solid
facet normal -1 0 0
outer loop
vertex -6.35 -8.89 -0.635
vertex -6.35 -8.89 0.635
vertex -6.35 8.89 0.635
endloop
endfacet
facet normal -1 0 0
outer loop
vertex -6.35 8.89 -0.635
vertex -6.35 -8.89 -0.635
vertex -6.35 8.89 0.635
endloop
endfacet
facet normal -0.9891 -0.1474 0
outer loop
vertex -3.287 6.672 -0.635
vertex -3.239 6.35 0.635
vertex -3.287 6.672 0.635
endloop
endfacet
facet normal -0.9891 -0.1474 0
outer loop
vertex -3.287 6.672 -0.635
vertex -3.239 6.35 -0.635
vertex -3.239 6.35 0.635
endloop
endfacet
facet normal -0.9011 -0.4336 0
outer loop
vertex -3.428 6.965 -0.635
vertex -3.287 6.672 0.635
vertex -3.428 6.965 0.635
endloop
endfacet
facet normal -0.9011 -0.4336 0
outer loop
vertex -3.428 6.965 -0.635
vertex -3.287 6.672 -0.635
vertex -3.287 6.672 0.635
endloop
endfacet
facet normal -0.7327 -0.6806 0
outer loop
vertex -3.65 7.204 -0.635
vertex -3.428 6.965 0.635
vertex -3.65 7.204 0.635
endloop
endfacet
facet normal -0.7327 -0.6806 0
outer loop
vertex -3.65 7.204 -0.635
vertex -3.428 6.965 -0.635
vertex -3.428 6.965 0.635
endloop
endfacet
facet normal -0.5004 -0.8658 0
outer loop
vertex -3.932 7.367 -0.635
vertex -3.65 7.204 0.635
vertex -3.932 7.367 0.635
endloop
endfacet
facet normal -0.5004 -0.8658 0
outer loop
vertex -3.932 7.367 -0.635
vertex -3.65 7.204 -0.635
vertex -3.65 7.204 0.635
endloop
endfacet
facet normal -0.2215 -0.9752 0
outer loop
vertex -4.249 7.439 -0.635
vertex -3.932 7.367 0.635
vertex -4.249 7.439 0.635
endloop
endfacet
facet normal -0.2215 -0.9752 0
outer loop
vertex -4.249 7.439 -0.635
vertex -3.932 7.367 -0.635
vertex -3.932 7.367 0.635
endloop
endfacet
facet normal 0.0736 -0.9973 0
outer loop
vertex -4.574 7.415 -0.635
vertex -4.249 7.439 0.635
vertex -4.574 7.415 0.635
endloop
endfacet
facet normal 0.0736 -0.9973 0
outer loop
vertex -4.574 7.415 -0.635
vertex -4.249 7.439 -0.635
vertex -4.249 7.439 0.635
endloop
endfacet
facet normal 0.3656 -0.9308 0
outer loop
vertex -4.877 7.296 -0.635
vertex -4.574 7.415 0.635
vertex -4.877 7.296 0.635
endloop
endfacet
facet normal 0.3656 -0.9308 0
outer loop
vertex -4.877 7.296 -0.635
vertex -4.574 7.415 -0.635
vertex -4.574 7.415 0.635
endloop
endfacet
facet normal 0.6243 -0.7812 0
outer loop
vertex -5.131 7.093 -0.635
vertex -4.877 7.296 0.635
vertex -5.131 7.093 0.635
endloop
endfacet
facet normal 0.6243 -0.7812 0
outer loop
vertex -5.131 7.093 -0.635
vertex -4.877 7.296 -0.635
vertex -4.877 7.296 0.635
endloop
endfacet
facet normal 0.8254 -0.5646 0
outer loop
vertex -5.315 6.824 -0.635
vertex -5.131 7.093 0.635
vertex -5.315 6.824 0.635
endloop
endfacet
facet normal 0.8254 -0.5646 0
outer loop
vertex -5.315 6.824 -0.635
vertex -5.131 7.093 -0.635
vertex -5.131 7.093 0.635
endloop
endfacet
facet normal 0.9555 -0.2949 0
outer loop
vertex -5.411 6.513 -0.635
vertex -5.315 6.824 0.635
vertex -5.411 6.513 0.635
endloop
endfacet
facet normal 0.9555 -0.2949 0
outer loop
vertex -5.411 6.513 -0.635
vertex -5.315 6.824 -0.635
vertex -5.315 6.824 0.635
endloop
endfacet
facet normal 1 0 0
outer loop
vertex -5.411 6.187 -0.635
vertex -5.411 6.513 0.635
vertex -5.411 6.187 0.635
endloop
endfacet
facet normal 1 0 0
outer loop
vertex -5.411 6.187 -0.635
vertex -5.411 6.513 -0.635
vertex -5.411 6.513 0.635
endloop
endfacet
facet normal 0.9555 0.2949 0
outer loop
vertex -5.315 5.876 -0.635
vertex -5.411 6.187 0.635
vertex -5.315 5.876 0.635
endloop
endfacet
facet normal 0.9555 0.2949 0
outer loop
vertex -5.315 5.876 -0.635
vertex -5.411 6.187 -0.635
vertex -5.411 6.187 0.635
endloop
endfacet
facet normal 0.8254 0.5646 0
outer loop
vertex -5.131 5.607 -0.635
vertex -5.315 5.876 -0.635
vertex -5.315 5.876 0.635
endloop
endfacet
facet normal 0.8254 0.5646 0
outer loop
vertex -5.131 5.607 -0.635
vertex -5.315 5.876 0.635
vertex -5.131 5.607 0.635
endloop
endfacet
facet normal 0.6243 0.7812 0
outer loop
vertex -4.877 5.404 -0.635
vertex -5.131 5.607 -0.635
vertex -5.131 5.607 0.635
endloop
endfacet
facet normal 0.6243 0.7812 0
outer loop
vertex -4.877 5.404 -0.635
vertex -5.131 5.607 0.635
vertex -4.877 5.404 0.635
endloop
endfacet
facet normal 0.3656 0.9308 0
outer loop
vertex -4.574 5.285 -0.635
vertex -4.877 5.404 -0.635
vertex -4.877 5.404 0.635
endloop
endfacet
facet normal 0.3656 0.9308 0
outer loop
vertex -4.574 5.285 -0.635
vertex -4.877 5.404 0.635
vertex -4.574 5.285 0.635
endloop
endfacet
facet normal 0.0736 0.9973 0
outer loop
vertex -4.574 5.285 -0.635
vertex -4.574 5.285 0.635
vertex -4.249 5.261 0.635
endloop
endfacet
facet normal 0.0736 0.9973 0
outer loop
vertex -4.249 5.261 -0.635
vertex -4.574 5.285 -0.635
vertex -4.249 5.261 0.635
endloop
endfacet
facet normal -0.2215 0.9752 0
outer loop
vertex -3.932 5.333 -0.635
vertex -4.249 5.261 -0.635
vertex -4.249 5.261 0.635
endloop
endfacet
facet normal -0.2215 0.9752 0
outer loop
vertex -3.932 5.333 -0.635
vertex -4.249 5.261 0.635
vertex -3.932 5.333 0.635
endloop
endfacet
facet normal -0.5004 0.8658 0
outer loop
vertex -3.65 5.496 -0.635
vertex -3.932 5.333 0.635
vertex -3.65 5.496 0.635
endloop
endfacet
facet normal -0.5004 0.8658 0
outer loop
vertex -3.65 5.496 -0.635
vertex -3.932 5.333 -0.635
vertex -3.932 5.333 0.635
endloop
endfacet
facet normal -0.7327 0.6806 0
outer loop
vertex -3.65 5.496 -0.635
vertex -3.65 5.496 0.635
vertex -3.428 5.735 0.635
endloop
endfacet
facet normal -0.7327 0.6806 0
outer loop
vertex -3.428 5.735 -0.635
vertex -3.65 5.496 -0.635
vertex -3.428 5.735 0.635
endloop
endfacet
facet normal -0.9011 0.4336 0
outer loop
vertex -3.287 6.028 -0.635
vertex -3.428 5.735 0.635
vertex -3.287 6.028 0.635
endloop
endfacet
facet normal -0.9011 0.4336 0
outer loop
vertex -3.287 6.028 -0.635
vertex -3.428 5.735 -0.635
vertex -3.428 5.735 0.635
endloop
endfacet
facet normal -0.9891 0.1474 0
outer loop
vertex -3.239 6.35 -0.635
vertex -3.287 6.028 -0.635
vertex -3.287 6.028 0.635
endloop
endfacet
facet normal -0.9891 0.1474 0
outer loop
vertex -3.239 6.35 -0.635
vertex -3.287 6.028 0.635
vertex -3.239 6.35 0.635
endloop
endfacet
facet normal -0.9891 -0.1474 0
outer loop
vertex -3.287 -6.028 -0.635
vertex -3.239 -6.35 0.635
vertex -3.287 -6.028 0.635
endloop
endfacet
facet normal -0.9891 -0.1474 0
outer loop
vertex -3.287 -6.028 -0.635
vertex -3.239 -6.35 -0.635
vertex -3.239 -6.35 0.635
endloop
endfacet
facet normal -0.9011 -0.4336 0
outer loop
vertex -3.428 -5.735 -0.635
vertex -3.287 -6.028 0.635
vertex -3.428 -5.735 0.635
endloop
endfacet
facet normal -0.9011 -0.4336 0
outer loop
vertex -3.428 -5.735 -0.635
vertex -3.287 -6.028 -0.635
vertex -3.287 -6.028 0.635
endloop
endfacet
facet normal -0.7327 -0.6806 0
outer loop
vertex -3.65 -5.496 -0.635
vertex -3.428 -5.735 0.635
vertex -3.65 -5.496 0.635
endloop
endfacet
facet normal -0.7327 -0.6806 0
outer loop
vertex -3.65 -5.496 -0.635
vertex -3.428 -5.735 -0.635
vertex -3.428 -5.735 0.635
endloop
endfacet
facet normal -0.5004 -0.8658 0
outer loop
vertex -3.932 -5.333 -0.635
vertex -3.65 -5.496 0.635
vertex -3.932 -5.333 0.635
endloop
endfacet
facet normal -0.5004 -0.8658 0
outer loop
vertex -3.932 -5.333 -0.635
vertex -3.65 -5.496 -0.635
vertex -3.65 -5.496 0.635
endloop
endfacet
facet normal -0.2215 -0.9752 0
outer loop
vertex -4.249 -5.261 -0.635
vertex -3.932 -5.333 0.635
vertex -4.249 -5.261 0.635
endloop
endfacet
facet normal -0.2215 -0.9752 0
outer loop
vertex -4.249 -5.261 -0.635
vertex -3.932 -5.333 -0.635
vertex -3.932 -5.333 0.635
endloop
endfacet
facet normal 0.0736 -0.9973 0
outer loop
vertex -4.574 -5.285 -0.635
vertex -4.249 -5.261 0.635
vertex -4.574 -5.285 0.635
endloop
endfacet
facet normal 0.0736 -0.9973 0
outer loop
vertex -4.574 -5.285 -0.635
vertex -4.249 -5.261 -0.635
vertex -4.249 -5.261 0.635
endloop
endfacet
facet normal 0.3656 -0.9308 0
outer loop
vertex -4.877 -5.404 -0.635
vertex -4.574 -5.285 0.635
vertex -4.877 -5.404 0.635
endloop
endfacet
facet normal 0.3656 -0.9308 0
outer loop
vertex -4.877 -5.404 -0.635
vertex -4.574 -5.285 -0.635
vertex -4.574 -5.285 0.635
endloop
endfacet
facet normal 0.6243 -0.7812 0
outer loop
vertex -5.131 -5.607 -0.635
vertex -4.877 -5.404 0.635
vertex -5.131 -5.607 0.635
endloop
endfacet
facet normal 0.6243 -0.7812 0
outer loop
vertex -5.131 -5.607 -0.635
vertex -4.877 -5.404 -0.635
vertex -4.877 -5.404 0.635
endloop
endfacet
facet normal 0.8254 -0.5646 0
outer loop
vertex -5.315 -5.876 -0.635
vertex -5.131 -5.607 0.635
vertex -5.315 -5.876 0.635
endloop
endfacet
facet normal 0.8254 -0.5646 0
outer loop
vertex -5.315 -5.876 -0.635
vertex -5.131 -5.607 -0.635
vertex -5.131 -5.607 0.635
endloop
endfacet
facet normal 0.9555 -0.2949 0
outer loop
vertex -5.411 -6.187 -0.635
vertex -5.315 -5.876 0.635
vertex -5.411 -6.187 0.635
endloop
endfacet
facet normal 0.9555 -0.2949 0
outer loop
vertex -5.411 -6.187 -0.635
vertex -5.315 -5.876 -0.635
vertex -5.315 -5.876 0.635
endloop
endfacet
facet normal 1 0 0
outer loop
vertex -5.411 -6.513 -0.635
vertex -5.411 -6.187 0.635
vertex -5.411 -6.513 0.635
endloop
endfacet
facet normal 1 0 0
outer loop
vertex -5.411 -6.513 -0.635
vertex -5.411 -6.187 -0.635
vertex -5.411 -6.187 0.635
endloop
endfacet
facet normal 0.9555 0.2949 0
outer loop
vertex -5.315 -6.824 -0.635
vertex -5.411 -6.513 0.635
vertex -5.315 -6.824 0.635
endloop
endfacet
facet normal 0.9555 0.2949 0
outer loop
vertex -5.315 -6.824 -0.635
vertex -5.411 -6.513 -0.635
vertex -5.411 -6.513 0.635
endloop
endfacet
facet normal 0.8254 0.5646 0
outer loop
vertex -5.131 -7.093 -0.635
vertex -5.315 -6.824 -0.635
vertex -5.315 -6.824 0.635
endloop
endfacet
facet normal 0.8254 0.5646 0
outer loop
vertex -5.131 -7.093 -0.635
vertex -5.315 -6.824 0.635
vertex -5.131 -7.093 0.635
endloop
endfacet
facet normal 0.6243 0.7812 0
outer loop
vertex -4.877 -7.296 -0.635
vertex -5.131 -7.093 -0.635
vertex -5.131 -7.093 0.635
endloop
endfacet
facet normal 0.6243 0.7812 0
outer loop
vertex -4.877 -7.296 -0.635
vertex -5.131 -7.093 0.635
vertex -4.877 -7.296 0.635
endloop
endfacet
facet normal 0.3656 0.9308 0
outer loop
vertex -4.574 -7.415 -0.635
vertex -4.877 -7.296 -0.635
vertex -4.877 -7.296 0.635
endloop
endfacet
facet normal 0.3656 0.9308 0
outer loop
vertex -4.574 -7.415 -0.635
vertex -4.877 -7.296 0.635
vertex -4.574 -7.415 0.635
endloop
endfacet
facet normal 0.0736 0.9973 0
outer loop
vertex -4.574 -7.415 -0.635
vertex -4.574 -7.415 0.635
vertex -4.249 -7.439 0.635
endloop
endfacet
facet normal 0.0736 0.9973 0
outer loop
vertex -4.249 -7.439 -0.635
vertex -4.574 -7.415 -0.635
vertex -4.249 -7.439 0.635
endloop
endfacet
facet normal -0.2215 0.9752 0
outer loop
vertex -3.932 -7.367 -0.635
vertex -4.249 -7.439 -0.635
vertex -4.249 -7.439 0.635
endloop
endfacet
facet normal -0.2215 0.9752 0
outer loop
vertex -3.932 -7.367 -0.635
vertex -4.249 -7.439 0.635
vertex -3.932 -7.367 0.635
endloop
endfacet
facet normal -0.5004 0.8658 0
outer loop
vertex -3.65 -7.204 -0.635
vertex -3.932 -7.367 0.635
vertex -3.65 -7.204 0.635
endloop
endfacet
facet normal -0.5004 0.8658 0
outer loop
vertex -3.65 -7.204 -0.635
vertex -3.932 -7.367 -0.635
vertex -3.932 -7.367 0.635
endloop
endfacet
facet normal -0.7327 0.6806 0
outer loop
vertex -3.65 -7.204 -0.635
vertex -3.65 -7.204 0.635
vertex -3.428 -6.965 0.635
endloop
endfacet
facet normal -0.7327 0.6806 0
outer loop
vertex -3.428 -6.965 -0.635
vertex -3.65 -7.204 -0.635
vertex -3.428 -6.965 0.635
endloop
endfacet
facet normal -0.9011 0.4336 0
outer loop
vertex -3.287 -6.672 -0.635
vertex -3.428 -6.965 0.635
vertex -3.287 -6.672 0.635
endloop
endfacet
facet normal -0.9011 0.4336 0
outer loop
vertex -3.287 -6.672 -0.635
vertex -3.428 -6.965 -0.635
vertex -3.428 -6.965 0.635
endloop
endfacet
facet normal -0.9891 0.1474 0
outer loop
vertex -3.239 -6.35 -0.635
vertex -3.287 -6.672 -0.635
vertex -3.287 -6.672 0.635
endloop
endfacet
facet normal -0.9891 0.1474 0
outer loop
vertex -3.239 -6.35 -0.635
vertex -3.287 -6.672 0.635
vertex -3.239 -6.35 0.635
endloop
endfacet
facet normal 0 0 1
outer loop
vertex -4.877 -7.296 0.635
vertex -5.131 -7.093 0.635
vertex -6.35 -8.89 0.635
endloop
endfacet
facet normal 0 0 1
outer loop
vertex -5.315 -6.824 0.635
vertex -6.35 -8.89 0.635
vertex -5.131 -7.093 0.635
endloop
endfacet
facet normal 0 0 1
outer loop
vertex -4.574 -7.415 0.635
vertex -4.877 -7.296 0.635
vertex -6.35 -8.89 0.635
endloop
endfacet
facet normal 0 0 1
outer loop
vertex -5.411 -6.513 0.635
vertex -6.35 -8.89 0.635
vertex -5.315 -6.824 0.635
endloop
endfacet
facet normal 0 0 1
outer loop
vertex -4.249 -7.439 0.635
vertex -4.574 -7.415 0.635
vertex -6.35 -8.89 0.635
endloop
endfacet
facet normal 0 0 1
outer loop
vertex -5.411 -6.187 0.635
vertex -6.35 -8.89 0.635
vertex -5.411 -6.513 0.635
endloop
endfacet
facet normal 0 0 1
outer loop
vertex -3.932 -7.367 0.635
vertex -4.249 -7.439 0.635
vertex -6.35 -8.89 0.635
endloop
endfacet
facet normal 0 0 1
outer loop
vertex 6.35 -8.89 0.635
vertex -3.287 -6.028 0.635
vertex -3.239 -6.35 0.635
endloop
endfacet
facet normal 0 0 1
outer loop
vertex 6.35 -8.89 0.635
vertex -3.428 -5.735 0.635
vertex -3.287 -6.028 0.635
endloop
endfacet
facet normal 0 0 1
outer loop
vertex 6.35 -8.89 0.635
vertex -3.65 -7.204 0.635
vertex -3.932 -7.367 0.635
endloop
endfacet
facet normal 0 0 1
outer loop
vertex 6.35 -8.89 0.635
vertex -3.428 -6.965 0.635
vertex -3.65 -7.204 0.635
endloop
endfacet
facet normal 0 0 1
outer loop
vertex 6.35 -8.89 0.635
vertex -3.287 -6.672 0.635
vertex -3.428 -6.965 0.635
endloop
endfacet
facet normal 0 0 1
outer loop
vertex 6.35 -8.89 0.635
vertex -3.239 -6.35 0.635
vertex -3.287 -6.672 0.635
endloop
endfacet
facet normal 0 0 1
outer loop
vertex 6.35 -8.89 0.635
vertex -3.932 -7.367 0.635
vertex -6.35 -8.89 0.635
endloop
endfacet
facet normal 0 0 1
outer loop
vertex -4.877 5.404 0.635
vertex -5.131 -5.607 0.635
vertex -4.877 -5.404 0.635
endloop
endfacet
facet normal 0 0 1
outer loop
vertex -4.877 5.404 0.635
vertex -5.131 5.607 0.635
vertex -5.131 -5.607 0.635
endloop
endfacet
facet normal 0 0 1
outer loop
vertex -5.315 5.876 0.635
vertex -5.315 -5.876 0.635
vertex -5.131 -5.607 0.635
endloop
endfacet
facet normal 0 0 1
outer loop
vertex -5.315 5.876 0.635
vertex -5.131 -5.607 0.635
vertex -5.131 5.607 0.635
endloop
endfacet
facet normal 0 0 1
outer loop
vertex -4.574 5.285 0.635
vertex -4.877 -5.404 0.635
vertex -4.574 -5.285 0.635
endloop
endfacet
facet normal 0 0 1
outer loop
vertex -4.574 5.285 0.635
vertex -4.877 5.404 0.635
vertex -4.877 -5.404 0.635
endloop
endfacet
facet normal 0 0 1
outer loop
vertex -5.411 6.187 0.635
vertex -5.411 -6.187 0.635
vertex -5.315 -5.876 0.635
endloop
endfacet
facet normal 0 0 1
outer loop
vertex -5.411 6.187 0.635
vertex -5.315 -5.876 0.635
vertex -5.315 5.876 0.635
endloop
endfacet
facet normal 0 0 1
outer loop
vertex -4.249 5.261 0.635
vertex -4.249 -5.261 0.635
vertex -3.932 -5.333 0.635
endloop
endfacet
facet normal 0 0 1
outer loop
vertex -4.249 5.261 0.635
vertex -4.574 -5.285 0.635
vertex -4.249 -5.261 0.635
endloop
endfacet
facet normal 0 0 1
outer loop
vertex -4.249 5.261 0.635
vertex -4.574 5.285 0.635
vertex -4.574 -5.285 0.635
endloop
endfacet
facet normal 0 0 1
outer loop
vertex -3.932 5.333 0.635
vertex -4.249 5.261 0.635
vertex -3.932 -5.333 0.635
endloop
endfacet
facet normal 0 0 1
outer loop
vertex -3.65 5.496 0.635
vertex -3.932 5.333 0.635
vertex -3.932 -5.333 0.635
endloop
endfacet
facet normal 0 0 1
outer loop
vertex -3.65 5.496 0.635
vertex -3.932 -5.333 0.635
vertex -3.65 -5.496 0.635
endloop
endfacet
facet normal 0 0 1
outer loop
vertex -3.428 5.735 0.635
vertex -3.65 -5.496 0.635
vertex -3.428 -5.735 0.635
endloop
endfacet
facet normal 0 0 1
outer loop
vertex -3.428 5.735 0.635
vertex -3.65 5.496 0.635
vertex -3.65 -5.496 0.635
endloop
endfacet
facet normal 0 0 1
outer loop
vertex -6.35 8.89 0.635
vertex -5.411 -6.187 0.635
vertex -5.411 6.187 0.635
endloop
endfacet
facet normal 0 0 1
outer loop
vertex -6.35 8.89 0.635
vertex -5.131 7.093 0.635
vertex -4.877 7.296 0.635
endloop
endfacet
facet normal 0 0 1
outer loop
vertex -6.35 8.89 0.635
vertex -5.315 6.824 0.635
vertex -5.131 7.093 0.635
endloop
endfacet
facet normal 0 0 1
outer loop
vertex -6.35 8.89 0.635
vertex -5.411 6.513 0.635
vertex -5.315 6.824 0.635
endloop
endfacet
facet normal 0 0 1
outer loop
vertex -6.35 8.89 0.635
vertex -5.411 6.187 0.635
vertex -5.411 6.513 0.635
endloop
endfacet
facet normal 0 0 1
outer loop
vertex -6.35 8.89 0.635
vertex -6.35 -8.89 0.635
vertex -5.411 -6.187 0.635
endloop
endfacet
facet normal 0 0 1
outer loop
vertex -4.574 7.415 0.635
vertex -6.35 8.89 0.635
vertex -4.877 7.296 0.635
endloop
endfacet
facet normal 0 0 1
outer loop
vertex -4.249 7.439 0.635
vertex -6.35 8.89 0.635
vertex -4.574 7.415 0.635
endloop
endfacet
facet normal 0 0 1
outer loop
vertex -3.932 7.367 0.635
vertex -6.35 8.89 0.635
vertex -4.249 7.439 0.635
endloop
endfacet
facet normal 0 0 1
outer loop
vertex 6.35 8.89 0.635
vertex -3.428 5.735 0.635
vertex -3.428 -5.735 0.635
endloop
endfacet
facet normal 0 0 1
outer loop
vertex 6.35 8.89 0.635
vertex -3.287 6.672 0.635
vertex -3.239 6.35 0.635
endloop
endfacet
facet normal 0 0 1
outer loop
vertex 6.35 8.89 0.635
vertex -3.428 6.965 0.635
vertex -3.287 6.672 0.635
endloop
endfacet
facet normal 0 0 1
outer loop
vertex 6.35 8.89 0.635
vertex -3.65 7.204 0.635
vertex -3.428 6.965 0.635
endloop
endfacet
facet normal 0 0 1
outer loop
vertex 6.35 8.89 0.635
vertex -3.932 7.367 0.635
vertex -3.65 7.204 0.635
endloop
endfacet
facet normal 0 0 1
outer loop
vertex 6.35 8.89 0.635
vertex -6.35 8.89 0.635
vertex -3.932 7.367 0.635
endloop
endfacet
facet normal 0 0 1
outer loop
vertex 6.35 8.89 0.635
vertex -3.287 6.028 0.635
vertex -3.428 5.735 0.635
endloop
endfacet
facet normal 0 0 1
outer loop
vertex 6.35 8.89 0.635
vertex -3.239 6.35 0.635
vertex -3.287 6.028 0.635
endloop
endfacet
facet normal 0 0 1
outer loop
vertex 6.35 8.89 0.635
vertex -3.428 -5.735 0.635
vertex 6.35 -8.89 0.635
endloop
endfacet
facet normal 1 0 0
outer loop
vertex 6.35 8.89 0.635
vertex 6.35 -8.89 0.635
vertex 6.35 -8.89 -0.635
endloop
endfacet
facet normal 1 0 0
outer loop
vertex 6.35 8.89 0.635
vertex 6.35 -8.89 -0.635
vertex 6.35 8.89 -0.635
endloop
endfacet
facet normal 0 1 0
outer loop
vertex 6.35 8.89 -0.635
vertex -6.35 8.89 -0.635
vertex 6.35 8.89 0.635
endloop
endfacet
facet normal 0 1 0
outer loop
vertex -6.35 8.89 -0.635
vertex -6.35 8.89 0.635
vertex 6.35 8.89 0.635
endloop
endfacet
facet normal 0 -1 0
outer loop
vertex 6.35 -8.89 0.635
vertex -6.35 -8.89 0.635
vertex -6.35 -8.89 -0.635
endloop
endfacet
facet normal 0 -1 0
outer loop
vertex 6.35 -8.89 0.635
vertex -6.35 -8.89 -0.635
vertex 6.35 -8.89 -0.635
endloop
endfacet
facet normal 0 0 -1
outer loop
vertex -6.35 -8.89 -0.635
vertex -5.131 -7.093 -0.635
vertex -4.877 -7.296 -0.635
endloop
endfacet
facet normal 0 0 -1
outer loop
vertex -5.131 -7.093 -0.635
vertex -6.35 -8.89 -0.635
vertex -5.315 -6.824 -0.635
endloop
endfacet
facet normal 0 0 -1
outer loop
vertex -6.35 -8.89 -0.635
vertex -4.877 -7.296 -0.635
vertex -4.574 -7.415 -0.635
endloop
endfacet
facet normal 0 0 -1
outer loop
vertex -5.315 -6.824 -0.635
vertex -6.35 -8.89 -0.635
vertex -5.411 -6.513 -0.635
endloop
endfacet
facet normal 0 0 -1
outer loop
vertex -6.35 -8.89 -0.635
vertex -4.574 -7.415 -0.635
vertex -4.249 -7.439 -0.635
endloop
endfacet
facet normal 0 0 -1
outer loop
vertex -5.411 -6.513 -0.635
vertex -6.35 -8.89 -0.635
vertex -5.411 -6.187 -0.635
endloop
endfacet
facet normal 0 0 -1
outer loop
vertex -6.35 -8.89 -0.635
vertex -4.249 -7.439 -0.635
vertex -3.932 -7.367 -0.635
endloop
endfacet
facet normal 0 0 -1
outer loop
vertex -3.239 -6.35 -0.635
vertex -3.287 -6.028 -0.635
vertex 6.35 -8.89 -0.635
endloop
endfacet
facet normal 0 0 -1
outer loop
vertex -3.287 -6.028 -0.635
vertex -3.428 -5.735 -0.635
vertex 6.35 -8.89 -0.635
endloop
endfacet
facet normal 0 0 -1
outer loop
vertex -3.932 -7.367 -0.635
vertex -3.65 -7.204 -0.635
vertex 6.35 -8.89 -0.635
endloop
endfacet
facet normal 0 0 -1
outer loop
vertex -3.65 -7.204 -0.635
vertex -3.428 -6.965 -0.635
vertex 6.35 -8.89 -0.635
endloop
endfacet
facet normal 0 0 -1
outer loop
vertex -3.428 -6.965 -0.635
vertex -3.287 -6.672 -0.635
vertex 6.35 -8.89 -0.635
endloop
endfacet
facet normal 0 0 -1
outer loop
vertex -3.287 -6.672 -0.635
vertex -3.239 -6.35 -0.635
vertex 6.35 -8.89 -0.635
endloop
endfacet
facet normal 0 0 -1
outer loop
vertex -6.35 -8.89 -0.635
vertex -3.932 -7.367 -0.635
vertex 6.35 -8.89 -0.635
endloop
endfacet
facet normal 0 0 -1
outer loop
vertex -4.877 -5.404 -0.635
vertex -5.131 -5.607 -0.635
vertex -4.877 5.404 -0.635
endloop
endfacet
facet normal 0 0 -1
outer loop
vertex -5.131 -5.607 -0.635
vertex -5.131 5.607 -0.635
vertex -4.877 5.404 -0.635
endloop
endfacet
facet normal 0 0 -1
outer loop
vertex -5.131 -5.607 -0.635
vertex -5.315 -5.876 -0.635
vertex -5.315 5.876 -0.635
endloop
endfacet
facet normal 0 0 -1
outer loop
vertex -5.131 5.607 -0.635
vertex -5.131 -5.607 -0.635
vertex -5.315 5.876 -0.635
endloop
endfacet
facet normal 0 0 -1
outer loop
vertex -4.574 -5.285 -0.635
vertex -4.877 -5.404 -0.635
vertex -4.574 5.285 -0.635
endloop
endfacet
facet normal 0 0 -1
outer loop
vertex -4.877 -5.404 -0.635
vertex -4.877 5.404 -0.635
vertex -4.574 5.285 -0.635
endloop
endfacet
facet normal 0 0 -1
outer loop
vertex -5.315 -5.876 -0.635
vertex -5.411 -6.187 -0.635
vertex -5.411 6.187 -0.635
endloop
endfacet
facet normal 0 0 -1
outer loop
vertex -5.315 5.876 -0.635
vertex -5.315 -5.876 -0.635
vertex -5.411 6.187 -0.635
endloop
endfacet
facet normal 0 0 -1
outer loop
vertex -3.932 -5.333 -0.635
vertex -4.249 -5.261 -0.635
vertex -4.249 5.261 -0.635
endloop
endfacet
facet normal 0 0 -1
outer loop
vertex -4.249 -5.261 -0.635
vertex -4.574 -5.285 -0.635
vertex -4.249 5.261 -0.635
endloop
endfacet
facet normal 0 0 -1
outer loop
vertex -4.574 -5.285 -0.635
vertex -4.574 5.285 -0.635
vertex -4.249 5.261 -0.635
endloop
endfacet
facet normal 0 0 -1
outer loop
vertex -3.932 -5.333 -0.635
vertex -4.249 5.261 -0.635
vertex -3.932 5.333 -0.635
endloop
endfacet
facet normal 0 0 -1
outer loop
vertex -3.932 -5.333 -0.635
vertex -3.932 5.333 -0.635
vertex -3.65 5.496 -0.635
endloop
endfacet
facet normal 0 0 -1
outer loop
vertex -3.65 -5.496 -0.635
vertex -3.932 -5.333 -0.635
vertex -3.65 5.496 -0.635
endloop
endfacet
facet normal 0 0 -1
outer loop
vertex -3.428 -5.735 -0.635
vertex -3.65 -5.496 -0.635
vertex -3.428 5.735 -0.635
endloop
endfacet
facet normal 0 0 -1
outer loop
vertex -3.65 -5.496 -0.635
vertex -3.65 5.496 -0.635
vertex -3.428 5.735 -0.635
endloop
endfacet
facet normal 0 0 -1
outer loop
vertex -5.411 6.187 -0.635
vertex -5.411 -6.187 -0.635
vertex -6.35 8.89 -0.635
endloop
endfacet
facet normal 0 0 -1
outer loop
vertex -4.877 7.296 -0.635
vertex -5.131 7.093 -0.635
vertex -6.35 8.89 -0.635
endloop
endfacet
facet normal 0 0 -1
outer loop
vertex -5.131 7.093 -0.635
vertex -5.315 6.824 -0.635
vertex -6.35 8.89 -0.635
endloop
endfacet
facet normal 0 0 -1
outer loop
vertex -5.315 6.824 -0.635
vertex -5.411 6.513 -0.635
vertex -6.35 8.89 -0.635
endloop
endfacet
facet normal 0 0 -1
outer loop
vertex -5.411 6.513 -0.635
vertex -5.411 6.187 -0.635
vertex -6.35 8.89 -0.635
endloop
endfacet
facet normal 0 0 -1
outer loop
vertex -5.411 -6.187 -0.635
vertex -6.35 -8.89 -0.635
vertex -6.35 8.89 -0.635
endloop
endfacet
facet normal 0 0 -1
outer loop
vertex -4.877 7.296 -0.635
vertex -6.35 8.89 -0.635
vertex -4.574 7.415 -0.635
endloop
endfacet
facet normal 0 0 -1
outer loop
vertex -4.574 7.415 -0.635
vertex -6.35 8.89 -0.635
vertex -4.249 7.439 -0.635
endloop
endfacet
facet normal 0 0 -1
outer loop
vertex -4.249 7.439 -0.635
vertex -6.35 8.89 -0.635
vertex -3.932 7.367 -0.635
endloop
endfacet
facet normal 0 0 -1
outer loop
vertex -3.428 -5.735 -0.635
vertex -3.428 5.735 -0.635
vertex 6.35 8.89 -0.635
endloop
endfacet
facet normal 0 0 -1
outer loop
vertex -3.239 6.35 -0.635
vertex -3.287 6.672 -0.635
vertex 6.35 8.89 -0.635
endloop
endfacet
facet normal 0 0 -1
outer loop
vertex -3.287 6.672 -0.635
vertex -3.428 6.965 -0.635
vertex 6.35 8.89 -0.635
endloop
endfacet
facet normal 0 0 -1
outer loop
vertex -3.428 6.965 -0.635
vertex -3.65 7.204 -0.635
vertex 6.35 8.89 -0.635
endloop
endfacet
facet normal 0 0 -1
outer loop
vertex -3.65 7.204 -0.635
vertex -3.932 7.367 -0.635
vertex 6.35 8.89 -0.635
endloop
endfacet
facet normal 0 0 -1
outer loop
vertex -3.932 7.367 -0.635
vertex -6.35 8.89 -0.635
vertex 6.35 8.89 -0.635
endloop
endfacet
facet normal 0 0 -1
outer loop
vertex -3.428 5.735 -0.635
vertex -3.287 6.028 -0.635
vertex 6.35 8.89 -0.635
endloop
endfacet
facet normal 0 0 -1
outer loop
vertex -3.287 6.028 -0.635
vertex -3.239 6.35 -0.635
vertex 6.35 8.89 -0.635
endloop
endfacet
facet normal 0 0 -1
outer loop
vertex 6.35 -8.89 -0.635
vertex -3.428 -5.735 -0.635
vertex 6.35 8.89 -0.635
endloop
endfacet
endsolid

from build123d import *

# Parameters (mm, degrees)
SKETCH1_W           = 12.7
SKETCH1_H           = 17.78
SKETCH1_R           = 1.0922
BOSS_EXTRUDE1_DEPTH = 0.635


with BuildPart() as part:
    # Sketch1 → Boss-Extrude1 (new body, symmetric)
    with BuildSketch(Plane.XY):
        Rectangle(SKETCH1_W, SKETCH1_H)
        with Locations((-4.330703088, 6.35)):
            Circle(SKETCH1_R, mode=Mode.SUBTRACT)
        with Locations((-4.330703088, -6.35)):
            Circle(SKETCH1_R, mode=Mode.SUBTRACT)
    extrude(amount=BOSS_EXTRUDE1_DEPTH, both=True)


solid = part.part
